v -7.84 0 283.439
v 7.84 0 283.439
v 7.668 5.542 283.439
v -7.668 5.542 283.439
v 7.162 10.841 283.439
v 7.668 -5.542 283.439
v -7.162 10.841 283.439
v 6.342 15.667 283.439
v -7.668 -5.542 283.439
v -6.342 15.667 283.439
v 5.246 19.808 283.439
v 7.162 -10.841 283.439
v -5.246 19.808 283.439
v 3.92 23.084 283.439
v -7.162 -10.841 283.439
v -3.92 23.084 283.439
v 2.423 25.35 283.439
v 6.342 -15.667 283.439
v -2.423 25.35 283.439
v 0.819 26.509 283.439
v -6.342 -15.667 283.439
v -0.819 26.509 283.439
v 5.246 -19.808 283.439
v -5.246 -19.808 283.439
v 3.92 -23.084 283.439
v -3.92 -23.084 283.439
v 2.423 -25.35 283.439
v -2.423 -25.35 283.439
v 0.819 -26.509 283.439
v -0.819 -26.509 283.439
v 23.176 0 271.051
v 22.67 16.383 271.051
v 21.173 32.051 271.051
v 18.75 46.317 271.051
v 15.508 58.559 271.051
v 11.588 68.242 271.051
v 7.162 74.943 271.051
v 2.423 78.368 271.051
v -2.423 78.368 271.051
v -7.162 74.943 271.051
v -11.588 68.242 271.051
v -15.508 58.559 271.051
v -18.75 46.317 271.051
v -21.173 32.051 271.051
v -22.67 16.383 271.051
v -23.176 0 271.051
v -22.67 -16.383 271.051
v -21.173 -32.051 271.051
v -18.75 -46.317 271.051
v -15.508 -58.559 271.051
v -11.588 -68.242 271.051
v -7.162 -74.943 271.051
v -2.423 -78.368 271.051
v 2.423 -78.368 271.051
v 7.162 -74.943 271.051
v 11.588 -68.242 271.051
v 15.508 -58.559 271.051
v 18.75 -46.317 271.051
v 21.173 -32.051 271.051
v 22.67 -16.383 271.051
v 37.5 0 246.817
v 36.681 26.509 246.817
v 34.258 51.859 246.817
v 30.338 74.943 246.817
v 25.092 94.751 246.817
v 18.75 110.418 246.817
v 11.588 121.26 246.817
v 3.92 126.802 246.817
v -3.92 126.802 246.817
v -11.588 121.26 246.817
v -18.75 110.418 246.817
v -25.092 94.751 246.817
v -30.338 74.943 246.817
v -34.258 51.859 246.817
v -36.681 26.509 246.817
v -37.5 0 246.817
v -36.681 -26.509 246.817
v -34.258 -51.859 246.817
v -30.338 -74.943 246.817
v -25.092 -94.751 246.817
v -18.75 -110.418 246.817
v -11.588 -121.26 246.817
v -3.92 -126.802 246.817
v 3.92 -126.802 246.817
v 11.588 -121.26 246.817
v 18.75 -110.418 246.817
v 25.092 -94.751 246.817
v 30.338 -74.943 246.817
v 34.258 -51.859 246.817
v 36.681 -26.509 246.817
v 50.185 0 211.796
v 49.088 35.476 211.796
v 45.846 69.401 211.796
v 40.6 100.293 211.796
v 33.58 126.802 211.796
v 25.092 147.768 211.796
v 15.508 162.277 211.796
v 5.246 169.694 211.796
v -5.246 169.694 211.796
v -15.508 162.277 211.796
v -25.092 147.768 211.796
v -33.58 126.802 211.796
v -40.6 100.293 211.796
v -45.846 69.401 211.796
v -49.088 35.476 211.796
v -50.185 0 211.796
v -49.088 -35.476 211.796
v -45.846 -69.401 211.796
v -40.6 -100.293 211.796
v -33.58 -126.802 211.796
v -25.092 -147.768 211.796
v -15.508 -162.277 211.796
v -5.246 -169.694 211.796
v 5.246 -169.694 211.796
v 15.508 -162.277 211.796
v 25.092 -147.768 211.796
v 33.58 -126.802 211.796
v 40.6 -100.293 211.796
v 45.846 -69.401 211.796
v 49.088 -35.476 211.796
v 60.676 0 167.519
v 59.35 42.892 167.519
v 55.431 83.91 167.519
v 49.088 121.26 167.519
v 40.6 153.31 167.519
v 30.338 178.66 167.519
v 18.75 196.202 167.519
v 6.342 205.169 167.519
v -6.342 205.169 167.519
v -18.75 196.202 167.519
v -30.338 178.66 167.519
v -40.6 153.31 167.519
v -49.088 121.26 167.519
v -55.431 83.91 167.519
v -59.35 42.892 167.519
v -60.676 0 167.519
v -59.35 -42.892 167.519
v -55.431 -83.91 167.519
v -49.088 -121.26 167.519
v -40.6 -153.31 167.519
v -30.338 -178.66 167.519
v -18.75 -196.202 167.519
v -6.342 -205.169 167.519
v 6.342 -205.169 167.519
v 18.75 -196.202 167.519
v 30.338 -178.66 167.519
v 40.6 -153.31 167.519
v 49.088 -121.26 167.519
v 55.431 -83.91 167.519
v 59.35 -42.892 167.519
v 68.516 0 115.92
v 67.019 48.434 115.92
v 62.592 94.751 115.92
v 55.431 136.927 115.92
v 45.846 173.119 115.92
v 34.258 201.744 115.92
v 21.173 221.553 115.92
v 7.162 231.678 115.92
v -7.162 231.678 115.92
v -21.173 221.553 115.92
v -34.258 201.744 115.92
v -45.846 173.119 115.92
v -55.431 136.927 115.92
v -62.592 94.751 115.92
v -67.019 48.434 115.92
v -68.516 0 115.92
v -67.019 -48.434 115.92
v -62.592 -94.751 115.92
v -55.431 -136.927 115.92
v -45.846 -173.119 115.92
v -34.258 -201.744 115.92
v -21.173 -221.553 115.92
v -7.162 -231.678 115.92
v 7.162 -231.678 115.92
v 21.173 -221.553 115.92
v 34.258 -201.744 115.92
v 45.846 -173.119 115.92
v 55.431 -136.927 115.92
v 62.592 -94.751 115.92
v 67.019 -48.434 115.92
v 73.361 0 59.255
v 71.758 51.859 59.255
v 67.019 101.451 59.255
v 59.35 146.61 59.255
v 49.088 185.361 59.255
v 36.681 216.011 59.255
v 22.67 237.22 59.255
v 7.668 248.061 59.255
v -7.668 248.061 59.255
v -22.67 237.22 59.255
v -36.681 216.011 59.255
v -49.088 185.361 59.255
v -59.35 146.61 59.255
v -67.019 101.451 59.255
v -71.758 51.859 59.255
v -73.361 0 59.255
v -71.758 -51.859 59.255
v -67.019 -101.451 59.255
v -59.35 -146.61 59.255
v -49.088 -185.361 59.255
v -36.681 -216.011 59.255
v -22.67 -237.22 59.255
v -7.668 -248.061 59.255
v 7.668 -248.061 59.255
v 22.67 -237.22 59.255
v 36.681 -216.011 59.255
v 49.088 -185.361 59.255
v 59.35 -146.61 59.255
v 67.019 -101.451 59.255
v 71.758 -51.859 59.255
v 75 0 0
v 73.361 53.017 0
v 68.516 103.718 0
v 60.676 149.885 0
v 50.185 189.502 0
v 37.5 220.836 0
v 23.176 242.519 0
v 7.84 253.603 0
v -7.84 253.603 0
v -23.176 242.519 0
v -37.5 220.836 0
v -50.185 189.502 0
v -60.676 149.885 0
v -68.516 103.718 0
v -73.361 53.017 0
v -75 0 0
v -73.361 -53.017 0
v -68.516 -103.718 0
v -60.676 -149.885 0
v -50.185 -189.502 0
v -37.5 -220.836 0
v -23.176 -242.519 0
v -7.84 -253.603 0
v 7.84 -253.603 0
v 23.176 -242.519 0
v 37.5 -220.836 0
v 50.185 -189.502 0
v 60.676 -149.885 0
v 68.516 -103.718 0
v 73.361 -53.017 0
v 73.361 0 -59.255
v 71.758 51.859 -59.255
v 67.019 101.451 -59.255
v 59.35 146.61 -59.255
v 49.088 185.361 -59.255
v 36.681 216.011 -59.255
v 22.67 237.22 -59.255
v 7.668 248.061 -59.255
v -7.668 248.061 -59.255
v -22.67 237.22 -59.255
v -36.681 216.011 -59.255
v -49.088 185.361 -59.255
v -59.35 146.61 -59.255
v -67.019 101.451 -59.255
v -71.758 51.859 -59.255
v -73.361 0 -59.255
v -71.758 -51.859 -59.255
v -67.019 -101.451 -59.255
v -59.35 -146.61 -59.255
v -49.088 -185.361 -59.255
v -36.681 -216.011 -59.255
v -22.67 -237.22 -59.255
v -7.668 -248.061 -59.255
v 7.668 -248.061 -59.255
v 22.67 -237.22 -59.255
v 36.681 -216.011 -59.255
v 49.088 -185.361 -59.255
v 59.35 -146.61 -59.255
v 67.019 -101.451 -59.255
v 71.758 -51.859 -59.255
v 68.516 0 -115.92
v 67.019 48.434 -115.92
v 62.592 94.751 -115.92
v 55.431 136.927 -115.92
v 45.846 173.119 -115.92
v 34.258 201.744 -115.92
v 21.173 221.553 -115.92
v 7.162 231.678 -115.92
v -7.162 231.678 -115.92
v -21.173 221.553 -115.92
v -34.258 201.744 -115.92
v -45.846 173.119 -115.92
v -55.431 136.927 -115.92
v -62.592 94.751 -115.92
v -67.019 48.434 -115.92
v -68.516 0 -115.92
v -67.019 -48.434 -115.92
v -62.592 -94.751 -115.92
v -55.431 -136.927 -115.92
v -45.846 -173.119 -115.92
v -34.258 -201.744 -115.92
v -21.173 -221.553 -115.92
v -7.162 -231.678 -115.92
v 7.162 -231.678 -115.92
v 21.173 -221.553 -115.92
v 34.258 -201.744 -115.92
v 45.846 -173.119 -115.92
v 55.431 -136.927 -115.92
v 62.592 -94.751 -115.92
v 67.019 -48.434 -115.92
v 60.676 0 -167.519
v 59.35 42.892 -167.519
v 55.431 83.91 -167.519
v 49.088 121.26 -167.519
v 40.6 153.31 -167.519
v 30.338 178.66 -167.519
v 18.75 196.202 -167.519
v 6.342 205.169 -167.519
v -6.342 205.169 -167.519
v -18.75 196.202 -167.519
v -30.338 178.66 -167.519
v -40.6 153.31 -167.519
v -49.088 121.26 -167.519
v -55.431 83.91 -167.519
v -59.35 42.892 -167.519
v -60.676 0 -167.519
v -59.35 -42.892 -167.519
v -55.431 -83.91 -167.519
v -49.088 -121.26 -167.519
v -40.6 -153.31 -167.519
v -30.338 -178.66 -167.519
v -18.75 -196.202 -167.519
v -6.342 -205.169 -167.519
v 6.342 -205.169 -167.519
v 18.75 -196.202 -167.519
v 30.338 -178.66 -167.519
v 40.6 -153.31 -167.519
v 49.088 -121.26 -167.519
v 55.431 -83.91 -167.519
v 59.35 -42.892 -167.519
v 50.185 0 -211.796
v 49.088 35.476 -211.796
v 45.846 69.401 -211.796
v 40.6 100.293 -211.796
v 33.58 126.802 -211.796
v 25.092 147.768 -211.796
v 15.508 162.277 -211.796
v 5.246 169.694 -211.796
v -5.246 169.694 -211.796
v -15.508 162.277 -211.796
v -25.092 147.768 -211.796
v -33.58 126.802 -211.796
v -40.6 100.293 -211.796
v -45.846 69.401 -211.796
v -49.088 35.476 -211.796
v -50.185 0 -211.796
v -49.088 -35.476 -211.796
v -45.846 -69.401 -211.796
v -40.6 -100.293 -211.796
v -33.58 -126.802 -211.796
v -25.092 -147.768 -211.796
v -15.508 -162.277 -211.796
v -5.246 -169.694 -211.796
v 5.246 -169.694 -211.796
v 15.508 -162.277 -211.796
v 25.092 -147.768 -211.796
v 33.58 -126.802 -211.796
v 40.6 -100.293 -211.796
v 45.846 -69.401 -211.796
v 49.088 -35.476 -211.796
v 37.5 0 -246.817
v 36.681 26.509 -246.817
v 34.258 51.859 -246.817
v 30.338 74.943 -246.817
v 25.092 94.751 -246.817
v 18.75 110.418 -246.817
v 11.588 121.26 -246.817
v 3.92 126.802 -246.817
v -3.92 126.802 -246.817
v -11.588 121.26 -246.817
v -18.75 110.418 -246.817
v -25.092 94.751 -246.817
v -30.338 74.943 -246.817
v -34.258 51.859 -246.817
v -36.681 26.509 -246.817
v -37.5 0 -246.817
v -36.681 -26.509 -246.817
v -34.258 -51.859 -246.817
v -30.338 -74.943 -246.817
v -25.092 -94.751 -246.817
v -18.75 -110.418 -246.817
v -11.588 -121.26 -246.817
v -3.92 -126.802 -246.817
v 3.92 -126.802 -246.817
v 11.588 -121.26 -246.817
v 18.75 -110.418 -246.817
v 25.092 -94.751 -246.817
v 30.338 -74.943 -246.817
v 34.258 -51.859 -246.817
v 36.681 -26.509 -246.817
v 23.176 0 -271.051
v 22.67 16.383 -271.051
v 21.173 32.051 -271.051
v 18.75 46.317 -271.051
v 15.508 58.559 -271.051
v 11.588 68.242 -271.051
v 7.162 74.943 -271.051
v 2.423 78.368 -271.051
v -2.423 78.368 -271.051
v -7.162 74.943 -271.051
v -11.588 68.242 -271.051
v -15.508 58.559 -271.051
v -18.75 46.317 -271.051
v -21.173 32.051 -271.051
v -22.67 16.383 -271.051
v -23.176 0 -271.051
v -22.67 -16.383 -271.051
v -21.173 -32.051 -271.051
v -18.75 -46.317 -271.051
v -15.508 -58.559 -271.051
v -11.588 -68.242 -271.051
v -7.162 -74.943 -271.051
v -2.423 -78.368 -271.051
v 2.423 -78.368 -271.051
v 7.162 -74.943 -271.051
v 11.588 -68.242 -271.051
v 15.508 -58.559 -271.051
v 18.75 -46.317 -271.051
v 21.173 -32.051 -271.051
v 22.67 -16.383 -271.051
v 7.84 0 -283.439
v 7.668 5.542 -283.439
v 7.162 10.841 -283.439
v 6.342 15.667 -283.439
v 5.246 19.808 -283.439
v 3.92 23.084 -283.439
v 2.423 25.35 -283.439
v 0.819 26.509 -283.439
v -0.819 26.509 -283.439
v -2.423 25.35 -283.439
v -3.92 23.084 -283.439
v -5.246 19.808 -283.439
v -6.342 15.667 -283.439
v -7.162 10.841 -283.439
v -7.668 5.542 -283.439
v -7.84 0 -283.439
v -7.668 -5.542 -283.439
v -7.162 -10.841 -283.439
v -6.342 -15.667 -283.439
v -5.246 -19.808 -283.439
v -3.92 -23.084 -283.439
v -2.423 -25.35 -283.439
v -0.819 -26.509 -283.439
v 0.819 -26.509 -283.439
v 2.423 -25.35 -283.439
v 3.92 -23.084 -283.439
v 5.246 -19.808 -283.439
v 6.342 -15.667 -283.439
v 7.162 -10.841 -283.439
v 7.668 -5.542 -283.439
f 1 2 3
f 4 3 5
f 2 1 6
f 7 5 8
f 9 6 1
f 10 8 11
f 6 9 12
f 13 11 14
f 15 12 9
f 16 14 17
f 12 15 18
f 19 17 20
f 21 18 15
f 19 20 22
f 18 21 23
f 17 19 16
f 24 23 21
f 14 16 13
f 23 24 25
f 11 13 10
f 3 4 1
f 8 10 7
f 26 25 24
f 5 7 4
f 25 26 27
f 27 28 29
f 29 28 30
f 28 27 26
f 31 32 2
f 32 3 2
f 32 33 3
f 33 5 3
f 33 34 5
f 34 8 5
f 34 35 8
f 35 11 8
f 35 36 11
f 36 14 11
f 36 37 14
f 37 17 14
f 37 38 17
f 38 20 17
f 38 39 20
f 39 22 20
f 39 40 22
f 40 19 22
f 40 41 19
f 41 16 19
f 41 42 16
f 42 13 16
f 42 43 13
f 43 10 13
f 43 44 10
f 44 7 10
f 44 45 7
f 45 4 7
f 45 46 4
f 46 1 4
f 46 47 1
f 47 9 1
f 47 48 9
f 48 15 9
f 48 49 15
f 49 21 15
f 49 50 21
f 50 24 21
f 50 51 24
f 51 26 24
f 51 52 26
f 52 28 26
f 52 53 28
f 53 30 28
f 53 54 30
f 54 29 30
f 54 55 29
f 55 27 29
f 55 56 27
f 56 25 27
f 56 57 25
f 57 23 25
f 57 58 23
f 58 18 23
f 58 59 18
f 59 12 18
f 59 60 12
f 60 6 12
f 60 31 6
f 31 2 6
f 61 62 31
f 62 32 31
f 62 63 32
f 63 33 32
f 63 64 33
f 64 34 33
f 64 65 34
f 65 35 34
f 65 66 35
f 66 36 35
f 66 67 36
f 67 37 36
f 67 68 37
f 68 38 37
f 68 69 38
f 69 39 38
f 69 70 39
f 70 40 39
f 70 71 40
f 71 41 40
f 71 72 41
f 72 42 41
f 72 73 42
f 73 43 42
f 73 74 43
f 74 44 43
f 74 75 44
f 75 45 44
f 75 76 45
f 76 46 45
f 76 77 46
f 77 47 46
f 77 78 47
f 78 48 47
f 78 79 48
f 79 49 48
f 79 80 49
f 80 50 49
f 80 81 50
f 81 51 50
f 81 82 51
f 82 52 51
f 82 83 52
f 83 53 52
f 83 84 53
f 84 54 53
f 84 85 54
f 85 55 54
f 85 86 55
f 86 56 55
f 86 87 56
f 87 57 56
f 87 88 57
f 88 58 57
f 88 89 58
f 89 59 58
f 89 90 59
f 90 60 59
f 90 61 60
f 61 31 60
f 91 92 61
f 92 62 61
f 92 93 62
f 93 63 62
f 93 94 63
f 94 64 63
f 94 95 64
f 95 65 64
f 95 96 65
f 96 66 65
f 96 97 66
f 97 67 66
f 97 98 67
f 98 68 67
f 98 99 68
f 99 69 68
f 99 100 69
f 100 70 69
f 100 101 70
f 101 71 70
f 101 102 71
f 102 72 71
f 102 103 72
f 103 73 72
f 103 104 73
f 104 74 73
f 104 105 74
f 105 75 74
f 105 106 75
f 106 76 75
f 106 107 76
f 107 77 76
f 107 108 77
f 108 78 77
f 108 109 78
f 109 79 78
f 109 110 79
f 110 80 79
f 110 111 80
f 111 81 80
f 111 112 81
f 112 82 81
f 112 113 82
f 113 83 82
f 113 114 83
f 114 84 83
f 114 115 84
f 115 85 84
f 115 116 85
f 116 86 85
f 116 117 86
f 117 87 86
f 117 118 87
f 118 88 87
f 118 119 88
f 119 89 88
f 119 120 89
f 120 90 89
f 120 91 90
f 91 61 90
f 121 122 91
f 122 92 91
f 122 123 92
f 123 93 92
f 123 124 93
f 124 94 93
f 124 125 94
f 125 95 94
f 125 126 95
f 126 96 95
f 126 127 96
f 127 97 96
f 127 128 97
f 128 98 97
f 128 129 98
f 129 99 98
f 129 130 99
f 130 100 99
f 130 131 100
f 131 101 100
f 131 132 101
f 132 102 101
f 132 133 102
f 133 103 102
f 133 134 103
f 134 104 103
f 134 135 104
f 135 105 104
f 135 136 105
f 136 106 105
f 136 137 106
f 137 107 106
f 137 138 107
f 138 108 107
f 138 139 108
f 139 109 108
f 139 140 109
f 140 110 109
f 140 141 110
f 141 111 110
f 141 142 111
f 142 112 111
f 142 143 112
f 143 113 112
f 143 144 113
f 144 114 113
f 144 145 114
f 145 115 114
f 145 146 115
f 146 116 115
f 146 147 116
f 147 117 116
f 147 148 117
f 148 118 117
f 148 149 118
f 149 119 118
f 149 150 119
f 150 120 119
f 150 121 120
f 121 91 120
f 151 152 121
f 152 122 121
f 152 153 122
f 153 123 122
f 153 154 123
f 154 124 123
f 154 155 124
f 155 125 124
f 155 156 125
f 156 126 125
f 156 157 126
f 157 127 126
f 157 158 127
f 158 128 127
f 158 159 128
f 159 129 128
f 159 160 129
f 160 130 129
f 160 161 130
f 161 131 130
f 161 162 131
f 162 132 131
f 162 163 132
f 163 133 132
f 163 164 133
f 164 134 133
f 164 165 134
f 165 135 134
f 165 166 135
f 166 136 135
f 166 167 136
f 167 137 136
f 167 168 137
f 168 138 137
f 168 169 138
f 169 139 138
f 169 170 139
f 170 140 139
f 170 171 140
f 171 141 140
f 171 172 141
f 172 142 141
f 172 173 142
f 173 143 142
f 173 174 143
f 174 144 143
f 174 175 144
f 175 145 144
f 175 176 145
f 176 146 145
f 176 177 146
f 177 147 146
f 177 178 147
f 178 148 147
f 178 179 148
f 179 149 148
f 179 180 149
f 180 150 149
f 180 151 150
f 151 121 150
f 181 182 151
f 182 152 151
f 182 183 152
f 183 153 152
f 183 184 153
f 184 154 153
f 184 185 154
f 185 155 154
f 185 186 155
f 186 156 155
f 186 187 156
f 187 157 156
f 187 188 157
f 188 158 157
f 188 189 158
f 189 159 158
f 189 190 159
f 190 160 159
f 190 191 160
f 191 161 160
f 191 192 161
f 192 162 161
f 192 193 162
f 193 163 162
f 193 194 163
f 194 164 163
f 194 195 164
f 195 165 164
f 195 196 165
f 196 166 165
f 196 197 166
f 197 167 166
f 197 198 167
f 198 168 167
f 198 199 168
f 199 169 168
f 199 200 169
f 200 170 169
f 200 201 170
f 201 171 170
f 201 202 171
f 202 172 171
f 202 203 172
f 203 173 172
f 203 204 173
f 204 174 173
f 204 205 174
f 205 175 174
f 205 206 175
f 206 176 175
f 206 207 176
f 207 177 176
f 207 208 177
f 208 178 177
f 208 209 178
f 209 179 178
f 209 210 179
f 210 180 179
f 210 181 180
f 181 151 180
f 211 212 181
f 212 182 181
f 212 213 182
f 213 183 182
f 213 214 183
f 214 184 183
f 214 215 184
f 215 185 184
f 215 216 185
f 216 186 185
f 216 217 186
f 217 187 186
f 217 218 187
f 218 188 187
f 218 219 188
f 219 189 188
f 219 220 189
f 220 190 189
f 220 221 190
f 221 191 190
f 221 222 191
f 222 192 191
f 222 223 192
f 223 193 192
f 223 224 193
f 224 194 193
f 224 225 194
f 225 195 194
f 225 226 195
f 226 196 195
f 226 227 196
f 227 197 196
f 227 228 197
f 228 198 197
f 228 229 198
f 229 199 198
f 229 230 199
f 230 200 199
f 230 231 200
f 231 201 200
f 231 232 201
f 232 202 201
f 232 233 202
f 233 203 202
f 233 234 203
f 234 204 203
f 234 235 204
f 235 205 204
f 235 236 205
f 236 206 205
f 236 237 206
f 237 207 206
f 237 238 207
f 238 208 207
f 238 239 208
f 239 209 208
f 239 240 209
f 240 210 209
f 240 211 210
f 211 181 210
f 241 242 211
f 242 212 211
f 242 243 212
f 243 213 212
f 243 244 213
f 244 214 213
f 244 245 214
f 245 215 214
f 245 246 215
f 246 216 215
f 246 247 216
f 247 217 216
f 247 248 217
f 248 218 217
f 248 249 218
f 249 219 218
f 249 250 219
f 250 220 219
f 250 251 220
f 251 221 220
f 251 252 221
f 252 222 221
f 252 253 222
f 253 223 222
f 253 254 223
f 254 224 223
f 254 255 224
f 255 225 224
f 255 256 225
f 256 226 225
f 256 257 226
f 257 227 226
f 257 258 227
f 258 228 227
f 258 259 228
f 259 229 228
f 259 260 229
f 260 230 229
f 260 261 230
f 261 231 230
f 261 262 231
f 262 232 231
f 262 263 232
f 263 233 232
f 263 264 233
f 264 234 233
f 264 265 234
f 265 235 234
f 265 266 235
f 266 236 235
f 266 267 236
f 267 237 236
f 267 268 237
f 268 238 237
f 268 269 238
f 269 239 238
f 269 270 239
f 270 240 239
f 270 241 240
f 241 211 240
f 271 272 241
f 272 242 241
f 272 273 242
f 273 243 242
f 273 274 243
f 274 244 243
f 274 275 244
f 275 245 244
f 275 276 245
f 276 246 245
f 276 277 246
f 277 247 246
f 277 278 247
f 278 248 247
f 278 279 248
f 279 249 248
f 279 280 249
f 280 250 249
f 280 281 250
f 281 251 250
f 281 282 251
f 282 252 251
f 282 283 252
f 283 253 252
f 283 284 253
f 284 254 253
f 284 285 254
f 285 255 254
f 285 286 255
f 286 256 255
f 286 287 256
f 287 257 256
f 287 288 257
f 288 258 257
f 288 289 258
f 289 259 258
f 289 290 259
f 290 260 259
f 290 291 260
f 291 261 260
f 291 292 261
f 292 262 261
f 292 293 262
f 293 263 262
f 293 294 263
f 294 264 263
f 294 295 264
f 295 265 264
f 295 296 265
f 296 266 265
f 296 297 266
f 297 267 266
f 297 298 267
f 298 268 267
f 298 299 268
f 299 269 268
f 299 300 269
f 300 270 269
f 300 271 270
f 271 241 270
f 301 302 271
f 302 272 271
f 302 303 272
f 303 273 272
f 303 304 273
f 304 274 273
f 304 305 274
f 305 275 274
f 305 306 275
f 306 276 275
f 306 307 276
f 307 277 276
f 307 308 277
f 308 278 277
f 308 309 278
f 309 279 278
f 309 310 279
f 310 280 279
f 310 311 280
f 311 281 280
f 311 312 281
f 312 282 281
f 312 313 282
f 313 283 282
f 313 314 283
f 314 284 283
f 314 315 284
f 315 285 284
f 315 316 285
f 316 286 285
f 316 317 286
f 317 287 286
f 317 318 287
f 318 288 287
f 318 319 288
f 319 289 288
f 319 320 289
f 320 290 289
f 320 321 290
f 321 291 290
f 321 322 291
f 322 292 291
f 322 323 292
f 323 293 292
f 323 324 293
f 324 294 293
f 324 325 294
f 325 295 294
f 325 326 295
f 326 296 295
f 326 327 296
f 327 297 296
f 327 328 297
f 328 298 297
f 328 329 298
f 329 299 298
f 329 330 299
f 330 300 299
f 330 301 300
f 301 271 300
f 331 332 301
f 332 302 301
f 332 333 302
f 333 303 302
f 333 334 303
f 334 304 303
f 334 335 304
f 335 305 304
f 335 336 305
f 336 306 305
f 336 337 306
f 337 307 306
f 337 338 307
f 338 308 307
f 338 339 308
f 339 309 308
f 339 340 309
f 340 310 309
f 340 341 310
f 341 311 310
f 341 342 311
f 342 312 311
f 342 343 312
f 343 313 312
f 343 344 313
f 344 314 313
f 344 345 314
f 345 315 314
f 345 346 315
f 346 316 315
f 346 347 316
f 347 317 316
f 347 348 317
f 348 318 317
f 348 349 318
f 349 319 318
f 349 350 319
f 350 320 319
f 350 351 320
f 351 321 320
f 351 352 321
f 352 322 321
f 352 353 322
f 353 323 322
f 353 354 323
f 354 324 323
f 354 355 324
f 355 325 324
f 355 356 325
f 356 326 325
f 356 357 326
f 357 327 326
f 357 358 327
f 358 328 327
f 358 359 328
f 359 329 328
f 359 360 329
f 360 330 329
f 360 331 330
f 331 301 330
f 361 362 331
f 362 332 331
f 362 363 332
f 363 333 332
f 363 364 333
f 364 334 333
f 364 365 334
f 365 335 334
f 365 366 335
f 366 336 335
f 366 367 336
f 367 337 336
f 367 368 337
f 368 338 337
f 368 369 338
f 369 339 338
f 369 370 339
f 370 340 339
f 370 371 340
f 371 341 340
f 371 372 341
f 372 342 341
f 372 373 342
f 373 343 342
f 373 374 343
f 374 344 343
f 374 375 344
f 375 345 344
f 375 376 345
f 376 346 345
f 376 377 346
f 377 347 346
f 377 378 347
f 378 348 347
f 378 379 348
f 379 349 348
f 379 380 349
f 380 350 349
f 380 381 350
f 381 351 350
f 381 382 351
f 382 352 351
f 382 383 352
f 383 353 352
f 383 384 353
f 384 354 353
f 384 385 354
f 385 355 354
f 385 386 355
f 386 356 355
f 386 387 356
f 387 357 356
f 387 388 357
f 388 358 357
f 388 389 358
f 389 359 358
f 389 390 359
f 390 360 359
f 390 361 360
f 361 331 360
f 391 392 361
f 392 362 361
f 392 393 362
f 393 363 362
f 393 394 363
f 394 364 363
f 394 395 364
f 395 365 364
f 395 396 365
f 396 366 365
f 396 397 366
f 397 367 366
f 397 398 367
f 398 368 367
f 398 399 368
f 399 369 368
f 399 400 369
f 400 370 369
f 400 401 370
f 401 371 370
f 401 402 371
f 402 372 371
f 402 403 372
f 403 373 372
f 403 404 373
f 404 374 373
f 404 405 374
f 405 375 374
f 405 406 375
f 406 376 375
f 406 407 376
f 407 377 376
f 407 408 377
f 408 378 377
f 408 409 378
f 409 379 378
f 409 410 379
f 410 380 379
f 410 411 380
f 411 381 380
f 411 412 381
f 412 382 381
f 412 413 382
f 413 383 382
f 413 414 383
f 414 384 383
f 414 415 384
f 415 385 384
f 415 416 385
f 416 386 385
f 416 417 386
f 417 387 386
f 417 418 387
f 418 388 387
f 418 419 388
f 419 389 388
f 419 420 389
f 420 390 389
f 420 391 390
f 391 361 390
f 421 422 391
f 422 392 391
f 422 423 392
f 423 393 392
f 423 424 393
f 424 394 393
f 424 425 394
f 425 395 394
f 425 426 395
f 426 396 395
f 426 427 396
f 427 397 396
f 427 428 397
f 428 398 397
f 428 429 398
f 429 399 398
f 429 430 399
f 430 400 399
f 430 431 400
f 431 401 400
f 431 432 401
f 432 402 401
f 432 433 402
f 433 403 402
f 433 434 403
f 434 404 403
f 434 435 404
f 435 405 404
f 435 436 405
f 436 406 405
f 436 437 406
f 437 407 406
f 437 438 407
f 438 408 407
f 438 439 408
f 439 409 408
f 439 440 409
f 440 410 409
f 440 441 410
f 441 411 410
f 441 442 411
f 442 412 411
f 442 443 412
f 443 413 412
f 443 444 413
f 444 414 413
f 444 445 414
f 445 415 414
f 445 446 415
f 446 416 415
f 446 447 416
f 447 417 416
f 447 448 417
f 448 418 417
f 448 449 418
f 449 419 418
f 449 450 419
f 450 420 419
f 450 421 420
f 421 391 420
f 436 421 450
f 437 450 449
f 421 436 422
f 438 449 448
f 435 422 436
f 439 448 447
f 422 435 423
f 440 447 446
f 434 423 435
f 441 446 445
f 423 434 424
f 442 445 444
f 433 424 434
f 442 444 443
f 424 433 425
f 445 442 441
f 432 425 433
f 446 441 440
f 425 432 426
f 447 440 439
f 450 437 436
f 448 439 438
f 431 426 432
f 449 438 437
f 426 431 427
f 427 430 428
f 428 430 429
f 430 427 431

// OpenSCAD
// Generated by SolidPython 1.0.1 on 2020-07-29 00:46:47


scale(v = [5, 17, 19]) {
	sphere(r = 15);
}
/***********************************************
*********      SolidPython code:      **********
************************************************
 
# import packages: SolidPython
from solid import *
from solid.utils import *
from itertools import chain, combinations, permutations


class Resize:

    def __init__(self, scad_file):
        self.scad_file = scad_file
        #self.scad_file = import_scad(scad_file)
        # cone/cylinder param:
        self.r1 = 0
        self.r2 = 0
        self.h = 0
        # rectangular prism param:
        self.w = 0
        self.l = 0
        # ellipse param:
        self.r = 0

    # import OpenScad code (file name corresponds to shape)


    # classify shape + parameters
    def assign(self, param1, param2, param3):
        if self.scad_file == 'cone.scad':
            self.r1 = param1
            self.r2 = param2
            self.h = param3
        elif self.scad_file == 'cylinder.scad':
            self.r1 = param1
            self.r2 = param2
            self.h = param3
        elif self.scad_file == 'rectangularPrism.scad':
            self.h = param1
            self.l = param2
            self.w = param3
        else:
            self.r = param1
            self.h = param2

    # resize parameters
    def iterate(self):
        x = range(3, 20, 2)
        i = 1
        if self.scad_file == 'cone.scad':
            tempList = list(permutations(x, 2))
            for temp in tempList:
                param1 = temp[0]
                param2 = temp[1]
                filepath = 'produced_scad_files/' + 'cone' + str(param1) + '_' + str(param2) + '_' + '.scad'
                scad_render_to_file(cylinder(h=param1, r1=param2, r2=0), filepath)

        elif self.scad_file == 'cylinder.scad':
            tempList = list(permutations(x, 3))
            for temp in tempList:
                param1 = temp[0]
                param2 = temp[1]
                filepath = 'produced_scad_files/' + 'cylinder' + str(param1) + '_' + str(param2) + '_' + '.scad'
                scad_render_to_file(cylinder(h=param1, r1=param2, r2=param2), filepath)

        elif self.scad_file == 'rectangularPrism.scad':
            tempList = list(permutations(x, 3))
            for temp in tempList:
                param1 = temp[0]
                param2 = temp[1]
                param3 = temp[2]
                filepath = 'produced_scad_files/' + 'rectangularPrism' + str(param1) + '_' + str(param2) + '_' + str(
                    param3) + '.scad'
                scad_render_to_file(cube(size=(param1, param2, param3)), filepath)

        elif self.scad_file == 'ellipse.scad':
            tempList = list(permutations(x, 4))
            for temp in tempList:
                param1 = temp[0]
                param2 = temp[1]
                param3 = temp[2]
                param4 = temp[3]
                filepath = 'produced_scad_files/' + 'ellipse' + str(param1) + '_' + str(param2) + '_' + str(param3) + '_' + str(param4) + '.scad'
                scad_render_to_file(scale([param1, param2, param3])(sphere(r=param4)), filepath)

    def render_to_scadfile(self):
        scad_render_to_file(scad, 'example.scad') 
 
************************************************/
